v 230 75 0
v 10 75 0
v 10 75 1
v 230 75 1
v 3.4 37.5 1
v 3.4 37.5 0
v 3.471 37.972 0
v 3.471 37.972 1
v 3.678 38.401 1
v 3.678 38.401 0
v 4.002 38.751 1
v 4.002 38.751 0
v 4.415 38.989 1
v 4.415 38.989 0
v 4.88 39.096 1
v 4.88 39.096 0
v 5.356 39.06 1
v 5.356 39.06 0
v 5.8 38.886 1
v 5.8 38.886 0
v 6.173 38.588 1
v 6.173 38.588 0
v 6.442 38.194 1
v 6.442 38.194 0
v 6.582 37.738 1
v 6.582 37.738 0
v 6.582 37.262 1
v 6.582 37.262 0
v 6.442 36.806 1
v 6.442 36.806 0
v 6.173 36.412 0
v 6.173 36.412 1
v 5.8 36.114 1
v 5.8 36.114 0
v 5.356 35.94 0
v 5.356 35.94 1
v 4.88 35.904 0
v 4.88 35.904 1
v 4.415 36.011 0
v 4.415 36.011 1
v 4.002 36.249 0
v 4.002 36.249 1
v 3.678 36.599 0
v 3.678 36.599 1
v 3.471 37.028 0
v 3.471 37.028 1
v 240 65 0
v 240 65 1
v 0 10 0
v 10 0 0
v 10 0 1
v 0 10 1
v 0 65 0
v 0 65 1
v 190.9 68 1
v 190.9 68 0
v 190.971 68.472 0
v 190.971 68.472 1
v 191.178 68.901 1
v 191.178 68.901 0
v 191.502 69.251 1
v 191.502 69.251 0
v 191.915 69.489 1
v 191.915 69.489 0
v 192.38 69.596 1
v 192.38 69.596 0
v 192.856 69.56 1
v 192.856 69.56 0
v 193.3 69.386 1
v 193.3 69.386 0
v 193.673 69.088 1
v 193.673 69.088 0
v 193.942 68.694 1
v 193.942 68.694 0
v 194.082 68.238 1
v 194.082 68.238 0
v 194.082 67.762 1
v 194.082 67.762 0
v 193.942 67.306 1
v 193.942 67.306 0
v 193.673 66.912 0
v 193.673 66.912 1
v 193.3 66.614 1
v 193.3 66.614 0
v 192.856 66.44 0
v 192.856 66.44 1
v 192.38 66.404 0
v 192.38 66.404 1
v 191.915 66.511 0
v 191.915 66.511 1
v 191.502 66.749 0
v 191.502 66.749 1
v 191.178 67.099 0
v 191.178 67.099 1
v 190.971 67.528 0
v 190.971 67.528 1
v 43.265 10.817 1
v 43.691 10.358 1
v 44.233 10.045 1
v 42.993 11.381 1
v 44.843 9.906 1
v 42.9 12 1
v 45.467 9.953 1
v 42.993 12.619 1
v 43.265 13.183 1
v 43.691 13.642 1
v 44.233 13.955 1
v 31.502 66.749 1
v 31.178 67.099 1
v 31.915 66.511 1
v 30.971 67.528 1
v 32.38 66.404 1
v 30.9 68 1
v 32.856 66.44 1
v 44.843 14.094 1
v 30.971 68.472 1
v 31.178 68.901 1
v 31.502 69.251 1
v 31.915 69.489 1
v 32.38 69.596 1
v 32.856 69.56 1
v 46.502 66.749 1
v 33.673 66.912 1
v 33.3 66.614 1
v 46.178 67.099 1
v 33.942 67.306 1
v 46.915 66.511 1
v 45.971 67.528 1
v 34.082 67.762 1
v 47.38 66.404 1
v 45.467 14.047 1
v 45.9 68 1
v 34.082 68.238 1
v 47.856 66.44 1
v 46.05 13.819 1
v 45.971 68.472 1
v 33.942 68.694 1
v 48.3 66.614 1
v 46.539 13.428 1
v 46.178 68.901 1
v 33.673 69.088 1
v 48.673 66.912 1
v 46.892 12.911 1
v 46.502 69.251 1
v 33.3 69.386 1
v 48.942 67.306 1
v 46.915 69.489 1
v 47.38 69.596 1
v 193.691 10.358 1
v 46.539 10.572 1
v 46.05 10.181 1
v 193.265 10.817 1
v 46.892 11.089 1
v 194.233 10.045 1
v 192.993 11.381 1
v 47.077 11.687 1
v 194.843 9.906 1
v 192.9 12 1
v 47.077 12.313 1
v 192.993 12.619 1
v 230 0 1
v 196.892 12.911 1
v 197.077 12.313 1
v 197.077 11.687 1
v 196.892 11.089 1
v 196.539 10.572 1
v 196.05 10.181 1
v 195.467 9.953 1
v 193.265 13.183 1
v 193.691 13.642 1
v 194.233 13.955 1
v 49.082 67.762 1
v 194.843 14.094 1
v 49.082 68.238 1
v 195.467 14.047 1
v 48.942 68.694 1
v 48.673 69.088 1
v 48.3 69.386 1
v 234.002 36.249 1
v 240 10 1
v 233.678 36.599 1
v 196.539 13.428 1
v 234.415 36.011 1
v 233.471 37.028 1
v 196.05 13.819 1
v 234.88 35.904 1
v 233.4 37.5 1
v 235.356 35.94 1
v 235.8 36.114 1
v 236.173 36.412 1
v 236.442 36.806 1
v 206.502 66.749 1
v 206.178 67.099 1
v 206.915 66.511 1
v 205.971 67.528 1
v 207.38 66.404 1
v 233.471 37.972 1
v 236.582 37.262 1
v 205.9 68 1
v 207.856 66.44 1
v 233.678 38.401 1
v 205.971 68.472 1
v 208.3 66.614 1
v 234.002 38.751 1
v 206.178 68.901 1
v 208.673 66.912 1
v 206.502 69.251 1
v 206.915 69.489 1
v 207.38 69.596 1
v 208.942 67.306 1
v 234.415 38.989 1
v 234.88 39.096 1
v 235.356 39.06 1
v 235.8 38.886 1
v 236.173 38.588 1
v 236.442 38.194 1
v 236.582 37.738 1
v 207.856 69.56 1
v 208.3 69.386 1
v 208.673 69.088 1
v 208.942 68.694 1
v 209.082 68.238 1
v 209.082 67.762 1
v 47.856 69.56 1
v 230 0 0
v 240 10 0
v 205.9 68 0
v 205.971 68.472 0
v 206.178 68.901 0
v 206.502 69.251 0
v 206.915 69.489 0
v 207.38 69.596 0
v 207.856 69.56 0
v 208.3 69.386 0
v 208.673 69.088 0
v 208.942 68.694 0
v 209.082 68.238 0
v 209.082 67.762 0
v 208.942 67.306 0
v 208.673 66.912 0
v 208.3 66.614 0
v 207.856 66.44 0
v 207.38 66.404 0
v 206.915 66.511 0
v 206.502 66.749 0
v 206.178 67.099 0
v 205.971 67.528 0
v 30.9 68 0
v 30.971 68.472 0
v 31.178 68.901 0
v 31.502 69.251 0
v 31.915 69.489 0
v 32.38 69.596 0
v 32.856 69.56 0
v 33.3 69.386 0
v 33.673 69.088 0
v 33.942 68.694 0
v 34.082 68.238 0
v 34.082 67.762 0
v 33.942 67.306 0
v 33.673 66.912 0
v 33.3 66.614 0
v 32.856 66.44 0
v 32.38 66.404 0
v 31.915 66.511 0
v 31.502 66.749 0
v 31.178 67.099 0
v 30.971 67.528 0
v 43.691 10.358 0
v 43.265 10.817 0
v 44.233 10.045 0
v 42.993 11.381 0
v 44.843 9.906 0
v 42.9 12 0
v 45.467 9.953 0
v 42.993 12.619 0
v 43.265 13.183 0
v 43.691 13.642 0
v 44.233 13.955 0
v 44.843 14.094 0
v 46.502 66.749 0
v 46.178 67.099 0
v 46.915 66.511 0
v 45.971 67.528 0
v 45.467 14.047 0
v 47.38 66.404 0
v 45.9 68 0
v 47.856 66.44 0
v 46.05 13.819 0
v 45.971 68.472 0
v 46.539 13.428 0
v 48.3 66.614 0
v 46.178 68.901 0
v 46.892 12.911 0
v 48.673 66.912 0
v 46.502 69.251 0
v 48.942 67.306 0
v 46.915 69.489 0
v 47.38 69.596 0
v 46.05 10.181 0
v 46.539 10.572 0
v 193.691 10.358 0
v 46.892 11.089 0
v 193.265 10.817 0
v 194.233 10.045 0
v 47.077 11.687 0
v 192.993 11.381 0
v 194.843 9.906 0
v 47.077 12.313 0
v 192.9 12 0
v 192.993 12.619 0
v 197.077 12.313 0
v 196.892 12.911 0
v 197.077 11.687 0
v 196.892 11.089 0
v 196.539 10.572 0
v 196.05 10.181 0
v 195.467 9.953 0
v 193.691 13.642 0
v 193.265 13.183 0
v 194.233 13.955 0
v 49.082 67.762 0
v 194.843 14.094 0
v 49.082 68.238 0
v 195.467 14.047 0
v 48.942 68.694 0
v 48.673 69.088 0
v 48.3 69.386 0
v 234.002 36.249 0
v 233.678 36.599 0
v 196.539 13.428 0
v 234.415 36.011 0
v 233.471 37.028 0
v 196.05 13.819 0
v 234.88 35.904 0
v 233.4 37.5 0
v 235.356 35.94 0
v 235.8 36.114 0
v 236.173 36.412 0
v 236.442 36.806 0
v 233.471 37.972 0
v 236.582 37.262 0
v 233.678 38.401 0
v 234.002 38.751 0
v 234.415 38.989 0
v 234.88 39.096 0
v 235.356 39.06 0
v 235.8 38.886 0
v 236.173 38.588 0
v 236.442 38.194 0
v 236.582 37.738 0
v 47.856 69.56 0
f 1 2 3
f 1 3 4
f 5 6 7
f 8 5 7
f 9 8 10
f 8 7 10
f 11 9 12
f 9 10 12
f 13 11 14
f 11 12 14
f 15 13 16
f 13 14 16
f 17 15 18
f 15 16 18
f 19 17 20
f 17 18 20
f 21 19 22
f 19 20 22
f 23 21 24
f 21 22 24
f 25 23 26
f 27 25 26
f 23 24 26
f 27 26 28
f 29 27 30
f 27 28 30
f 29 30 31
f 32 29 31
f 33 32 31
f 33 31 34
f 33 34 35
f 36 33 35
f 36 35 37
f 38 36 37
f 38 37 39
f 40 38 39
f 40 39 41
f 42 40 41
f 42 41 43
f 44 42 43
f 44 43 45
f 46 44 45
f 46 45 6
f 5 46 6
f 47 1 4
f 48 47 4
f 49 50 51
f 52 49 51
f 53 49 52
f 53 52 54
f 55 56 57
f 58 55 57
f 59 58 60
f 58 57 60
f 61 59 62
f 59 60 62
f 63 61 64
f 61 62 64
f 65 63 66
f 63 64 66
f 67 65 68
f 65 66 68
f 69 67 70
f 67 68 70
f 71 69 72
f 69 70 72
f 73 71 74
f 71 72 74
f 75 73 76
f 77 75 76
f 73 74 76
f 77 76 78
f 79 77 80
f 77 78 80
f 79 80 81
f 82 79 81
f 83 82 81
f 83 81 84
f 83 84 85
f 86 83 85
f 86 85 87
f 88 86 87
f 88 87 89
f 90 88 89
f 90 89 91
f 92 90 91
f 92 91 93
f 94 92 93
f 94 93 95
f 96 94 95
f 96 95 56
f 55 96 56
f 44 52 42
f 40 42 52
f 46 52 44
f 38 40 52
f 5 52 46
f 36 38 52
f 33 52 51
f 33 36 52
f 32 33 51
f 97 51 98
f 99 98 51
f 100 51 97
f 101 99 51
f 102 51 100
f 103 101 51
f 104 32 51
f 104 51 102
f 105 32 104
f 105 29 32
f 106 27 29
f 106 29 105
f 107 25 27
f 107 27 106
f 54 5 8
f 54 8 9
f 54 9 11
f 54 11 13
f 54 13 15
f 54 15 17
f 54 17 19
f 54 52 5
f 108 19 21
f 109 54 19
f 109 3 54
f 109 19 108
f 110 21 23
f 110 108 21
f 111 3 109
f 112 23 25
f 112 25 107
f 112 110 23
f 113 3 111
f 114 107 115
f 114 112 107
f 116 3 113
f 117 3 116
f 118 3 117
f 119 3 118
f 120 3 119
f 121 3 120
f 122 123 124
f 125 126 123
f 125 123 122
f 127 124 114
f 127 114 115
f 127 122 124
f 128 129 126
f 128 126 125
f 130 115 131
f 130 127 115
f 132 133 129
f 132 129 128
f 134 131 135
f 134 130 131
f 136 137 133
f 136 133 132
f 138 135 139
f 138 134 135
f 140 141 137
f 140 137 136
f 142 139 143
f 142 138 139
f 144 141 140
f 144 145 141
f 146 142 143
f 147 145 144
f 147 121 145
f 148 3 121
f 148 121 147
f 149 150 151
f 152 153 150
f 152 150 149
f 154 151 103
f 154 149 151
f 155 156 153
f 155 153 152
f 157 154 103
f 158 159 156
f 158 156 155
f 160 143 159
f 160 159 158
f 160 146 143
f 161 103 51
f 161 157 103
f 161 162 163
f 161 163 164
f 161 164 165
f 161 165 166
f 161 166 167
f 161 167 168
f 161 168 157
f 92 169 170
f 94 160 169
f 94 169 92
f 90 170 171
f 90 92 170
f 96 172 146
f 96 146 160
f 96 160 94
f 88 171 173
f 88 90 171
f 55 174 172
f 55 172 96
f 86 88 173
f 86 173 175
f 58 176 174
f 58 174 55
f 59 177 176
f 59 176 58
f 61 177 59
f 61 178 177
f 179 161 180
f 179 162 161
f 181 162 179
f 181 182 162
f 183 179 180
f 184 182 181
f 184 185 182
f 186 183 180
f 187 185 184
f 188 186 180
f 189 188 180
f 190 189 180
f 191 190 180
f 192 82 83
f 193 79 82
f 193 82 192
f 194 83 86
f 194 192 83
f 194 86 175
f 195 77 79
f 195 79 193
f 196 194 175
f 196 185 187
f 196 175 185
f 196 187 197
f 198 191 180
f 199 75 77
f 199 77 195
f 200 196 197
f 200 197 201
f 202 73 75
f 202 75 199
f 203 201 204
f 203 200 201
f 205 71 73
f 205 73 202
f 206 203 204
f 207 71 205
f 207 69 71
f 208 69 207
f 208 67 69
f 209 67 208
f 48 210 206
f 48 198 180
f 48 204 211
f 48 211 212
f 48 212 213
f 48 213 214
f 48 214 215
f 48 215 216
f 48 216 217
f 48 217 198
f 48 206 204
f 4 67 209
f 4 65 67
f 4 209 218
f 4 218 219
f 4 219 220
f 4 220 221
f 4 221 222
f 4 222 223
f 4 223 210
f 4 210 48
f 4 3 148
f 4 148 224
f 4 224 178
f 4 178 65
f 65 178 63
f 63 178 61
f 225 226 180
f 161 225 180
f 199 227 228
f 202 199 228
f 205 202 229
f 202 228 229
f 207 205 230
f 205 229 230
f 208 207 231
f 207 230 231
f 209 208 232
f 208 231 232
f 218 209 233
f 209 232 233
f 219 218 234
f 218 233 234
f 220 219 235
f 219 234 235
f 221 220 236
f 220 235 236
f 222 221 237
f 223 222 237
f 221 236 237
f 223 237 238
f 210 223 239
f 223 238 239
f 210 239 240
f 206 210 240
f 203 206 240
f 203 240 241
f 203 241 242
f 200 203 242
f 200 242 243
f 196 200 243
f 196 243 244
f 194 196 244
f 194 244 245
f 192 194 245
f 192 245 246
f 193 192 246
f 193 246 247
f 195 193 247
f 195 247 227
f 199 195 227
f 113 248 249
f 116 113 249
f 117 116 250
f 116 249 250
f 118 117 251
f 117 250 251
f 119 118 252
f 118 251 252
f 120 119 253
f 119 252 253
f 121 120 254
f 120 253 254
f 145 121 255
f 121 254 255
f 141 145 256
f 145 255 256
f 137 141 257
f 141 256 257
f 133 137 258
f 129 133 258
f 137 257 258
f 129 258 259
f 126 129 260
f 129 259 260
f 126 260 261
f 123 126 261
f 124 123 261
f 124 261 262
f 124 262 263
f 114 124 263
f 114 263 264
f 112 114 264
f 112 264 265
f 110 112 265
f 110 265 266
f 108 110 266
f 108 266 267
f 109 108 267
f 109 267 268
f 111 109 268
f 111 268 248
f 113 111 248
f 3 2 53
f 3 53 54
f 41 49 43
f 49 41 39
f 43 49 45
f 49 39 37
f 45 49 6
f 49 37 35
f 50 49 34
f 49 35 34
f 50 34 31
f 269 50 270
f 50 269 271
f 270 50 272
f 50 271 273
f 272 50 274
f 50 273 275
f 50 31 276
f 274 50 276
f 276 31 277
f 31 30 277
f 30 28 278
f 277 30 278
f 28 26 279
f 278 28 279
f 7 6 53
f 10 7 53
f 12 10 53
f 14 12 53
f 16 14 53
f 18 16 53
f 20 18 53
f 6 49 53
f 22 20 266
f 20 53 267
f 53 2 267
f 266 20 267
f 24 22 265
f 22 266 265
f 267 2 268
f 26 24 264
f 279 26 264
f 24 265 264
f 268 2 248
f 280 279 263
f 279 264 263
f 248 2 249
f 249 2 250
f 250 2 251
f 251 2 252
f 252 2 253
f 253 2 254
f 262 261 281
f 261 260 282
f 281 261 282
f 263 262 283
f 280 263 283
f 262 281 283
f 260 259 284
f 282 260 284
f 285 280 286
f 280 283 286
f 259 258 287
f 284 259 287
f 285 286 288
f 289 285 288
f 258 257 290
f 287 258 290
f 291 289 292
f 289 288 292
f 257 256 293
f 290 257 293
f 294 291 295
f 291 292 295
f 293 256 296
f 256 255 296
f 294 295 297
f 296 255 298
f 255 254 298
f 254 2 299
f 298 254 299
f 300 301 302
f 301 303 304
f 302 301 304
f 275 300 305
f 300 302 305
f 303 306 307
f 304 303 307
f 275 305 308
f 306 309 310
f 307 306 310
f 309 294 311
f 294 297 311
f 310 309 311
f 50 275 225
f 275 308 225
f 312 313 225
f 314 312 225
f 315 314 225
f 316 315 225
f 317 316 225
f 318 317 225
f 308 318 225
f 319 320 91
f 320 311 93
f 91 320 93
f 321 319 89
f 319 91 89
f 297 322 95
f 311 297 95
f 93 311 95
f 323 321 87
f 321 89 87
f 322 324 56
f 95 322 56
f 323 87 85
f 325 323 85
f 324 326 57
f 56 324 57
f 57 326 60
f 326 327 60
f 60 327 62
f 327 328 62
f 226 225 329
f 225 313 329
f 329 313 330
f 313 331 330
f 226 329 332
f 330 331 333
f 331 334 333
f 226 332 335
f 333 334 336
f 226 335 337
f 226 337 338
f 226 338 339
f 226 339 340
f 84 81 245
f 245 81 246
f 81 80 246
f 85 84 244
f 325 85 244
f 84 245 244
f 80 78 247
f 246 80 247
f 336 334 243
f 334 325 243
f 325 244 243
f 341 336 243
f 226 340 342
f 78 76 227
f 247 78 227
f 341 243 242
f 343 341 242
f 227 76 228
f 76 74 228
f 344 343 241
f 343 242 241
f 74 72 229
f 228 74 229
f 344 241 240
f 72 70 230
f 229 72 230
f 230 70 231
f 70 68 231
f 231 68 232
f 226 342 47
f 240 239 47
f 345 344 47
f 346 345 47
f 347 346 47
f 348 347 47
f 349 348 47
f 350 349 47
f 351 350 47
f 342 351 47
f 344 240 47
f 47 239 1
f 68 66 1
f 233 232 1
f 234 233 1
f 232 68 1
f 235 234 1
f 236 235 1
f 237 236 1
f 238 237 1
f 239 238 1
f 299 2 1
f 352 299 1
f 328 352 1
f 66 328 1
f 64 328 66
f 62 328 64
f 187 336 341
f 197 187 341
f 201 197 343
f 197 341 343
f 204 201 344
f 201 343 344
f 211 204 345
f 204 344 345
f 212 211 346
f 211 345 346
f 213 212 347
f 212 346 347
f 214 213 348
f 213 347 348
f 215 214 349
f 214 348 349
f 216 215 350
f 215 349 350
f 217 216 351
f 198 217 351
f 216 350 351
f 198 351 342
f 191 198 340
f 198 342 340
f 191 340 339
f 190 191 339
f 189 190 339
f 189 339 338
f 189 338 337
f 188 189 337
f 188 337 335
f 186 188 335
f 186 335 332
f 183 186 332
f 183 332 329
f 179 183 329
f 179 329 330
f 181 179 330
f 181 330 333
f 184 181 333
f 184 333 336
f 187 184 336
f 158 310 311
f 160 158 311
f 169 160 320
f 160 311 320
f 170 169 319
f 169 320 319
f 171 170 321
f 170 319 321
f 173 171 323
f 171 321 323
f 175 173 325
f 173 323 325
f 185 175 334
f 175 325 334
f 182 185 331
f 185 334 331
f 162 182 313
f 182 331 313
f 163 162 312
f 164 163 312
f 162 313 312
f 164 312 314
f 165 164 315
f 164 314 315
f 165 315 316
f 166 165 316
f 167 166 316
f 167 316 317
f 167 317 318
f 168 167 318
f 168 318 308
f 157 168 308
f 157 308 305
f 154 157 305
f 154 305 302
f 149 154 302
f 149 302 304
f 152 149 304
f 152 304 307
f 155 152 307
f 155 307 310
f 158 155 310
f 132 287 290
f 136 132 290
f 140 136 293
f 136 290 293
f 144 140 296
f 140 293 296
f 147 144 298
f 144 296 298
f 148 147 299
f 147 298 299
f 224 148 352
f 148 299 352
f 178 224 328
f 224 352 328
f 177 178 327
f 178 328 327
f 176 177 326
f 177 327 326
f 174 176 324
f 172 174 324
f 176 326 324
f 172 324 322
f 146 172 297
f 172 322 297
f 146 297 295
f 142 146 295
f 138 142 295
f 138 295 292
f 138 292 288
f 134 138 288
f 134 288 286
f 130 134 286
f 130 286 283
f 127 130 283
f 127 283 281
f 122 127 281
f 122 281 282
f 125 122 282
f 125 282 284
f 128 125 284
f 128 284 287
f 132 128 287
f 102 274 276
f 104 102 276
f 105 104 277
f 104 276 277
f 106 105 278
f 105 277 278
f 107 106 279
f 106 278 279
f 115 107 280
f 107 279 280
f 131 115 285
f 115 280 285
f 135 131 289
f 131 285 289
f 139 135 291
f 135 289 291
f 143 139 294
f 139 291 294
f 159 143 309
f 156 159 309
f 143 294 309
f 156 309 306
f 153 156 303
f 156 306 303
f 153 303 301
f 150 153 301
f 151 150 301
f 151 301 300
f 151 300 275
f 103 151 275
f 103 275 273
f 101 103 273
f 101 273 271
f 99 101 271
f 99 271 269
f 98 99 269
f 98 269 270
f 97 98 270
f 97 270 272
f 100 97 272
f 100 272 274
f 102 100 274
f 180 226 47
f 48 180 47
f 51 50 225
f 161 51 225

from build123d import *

# Parameters (mm, degrees)
SKETCH_1_W          = 240
SKETCH_1_H          = 75
EXTRUDE_1_DEPTH     = 1
CHAMFER_1_SIZE      = 10
SKETCH_4_R          = 2.1
SKETCH_4_R_2        = 1.6
CUT_EXTRUDE_3_DEPTH = 10


with BuildPart() as part:
    # 草图1 → 凸台-拉伸1 (new body)
    with BuildSketch(Plane.XY):
        with Locations((120, 37.5)):
            Rectangle(SKETCH_1_W, SKETCH_1_H)
    extrude(amount=EXTRUDE_1_DEPTH)

    # 倒角1
    chamfer_1_edges = [part.edges().sort_by_distance(p)[0] for p in [
        (0, 75, 0.5),
        (240, 75, 0.5),
        (240, 0, 0.5),
        (0, 0, 0.5),
    ]]
    chamfer(chamfer_1_edges, length=CHAMFER_1_SIZE)

    # 草图4 → 切除-拉伸3 (cut)
    with BuildSketch(Plane(origin=(0, 0, 0), x_dir=(-1, 0, 0), z_dir=(0, 0, -1))):
        with Locations((-195, 12)):
            Circle(SKETCH_4_R)
        with Locations((-45, 12)):
            Circle(SKETCH_4_R)
        with Locations((-207.5, 68)):
            Circle(SKETCH_4_R_2)
        with Locations((-192.5, 68)):
            Circle(SKETCH_4_R_2)
        with Locations((-47.5, 68)):
            Circle(SKETCH_4_R_2)
        with Locations((-32.5, 68)):
            Circle(SKETCH_4_R_2)
        with Locations((-235, 37.5)):
            Circle(SKETCH_4_R_2)
        with Locations((-5, 37.5)):
            Circle(SKETCH_4_R_2)
    extrude(amount=-CUT_EXTRUDE_3_DEPTH, mode=Mode.SUBTRACT)


solid = part.part
